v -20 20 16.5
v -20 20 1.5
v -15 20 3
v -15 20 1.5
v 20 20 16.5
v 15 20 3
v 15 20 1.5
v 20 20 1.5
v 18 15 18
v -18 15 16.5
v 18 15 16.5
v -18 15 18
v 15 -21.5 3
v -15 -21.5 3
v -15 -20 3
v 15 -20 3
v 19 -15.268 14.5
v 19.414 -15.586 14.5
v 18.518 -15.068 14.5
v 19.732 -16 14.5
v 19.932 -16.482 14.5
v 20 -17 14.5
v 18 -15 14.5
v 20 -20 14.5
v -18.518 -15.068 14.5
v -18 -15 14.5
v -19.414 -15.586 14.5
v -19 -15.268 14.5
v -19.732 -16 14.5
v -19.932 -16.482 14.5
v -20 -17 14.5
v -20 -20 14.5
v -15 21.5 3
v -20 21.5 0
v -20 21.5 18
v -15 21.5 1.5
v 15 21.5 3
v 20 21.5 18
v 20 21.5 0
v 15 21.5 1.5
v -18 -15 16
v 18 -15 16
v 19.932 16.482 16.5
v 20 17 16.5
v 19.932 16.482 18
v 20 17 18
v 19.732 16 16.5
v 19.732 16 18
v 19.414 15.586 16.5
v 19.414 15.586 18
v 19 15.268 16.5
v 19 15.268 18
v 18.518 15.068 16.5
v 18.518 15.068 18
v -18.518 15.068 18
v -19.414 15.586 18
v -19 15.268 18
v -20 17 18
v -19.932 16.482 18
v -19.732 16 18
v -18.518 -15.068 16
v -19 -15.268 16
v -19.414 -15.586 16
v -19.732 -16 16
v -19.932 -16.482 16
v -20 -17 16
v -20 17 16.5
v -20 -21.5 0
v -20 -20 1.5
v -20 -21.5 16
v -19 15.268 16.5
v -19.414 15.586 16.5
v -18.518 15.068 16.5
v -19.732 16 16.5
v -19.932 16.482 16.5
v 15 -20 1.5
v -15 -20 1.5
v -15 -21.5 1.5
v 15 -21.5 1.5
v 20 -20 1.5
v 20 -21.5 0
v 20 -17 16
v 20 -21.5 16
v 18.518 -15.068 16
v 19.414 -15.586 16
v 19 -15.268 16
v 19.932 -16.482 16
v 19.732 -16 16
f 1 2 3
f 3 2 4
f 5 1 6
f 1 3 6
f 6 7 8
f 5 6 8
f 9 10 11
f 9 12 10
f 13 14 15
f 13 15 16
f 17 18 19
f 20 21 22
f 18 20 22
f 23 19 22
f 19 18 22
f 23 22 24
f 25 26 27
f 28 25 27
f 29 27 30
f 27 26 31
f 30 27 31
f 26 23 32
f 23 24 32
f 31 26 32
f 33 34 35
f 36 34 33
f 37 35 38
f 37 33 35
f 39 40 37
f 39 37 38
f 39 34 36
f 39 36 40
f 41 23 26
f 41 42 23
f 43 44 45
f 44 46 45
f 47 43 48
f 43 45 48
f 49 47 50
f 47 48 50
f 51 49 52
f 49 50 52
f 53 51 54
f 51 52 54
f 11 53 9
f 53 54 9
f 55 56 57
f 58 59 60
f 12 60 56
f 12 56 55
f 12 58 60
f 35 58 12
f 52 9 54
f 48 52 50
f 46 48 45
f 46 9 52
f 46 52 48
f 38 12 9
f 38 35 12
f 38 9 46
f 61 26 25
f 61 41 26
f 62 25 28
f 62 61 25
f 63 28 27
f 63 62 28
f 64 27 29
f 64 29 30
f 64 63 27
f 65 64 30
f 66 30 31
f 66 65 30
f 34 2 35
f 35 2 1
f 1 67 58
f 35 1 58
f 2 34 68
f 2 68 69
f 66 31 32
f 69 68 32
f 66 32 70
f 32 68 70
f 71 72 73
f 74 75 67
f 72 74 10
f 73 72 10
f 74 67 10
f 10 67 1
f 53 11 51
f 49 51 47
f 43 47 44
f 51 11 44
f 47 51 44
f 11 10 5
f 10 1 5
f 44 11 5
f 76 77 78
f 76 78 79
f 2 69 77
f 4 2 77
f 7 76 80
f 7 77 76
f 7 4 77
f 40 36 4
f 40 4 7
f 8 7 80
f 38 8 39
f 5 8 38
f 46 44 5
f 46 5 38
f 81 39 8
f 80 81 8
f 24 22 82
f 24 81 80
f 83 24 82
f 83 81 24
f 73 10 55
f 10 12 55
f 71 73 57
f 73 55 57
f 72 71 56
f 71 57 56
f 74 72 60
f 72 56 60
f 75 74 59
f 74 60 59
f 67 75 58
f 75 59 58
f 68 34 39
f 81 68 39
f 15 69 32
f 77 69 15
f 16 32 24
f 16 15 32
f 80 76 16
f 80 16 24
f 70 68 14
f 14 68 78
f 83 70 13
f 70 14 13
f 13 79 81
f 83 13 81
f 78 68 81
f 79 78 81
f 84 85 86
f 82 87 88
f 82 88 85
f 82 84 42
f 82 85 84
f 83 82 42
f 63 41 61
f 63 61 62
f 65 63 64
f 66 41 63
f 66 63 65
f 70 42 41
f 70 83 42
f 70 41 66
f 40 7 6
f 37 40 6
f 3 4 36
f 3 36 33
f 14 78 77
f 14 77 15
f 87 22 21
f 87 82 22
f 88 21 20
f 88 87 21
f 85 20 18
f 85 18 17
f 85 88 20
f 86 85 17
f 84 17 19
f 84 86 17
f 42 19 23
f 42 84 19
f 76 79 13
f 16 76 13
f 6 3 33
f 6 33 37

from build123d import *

# Parameters (mm, degrees)
F0_W      = 40
F0_H      = 43
F1_DEPTH  = 1.5
F2_W      = 40
F2_H      = 1.5
F3_DEPTH  = 14.5
F4_W      = 40
F4_H      = 1.5
F5_DEPTH  = 16.5
F6_W      = 40
F6_H      = 1.5
F7_DEPTH  = 5
F8_W      = 40
F8_H      = 1.5
F9_DEPTH  = 5
F10_W     = 30
F10_H     = 1.5
F11_DEPTH = 44
F12_R     = 2


with BuildPart() as f1:
    # F0 (on Top) → F1 (new body)
    with BuildSketch(Plane.XY):
        Rectangle(F0_W, F0_H)
    extrude(amount=F1_DEPTH)

    # F2 (on face) → F3 (join)
    with BuildSketch(Plane.XY.offset(1.5)):
        with Locations((0, -20.75)):
            Rectangle(F2_W, F2_H)
    extrude(amount=F3_DEPTH)

    # F4 (on face) → F5 (join)
    with BuildSketch(Plane.XY.offset(1.5)):
        with Locations((0, 20.75)):
            Rectangle(F4_W, F4_H)
    extrude(amount=F5_DEPTH)

    # F6 (on face) → F7 (join)
    with BuildSketch(Plane.XZ.offset(-20)):
        with Locations((0, 17.25)):
            Rectangle(F6_W, F6_H)
    extrude(amount=F7_DEPTH)

    # F8 (on face) → F9 (join)
    with BuildSketch(Plane(origin=(0, -20, 0), x_dir=(-1, 0, 0), z_dir=(0, 1, 0))):
        with Locations((0, 15.25)):
            Rectangle(F8_W, F8_H)
    extrude(amount=F9_DEPTH)

    # F10 (on face) → F11 (cut)
    with BuildSketch(Plane.XZ.offset(21.5)):
        with Locations((0, 2.25)):
            Rectangle(F10_W, F10_H)
    extrude(amount=-F11_DEPTH, mode=Mode.SUBTRACT)

    # F12
    f12_edges = [f1.edges().sort_by_distance(p)[0] for p in [
        (20, 15, 17.25),
        (20, -15, 15.25),
        (-20, 15, 17.25),
        (-20, -15, 15.25),
    ]]
    fillet(f12_edges, radius=F12_R)


solid = f1.part
